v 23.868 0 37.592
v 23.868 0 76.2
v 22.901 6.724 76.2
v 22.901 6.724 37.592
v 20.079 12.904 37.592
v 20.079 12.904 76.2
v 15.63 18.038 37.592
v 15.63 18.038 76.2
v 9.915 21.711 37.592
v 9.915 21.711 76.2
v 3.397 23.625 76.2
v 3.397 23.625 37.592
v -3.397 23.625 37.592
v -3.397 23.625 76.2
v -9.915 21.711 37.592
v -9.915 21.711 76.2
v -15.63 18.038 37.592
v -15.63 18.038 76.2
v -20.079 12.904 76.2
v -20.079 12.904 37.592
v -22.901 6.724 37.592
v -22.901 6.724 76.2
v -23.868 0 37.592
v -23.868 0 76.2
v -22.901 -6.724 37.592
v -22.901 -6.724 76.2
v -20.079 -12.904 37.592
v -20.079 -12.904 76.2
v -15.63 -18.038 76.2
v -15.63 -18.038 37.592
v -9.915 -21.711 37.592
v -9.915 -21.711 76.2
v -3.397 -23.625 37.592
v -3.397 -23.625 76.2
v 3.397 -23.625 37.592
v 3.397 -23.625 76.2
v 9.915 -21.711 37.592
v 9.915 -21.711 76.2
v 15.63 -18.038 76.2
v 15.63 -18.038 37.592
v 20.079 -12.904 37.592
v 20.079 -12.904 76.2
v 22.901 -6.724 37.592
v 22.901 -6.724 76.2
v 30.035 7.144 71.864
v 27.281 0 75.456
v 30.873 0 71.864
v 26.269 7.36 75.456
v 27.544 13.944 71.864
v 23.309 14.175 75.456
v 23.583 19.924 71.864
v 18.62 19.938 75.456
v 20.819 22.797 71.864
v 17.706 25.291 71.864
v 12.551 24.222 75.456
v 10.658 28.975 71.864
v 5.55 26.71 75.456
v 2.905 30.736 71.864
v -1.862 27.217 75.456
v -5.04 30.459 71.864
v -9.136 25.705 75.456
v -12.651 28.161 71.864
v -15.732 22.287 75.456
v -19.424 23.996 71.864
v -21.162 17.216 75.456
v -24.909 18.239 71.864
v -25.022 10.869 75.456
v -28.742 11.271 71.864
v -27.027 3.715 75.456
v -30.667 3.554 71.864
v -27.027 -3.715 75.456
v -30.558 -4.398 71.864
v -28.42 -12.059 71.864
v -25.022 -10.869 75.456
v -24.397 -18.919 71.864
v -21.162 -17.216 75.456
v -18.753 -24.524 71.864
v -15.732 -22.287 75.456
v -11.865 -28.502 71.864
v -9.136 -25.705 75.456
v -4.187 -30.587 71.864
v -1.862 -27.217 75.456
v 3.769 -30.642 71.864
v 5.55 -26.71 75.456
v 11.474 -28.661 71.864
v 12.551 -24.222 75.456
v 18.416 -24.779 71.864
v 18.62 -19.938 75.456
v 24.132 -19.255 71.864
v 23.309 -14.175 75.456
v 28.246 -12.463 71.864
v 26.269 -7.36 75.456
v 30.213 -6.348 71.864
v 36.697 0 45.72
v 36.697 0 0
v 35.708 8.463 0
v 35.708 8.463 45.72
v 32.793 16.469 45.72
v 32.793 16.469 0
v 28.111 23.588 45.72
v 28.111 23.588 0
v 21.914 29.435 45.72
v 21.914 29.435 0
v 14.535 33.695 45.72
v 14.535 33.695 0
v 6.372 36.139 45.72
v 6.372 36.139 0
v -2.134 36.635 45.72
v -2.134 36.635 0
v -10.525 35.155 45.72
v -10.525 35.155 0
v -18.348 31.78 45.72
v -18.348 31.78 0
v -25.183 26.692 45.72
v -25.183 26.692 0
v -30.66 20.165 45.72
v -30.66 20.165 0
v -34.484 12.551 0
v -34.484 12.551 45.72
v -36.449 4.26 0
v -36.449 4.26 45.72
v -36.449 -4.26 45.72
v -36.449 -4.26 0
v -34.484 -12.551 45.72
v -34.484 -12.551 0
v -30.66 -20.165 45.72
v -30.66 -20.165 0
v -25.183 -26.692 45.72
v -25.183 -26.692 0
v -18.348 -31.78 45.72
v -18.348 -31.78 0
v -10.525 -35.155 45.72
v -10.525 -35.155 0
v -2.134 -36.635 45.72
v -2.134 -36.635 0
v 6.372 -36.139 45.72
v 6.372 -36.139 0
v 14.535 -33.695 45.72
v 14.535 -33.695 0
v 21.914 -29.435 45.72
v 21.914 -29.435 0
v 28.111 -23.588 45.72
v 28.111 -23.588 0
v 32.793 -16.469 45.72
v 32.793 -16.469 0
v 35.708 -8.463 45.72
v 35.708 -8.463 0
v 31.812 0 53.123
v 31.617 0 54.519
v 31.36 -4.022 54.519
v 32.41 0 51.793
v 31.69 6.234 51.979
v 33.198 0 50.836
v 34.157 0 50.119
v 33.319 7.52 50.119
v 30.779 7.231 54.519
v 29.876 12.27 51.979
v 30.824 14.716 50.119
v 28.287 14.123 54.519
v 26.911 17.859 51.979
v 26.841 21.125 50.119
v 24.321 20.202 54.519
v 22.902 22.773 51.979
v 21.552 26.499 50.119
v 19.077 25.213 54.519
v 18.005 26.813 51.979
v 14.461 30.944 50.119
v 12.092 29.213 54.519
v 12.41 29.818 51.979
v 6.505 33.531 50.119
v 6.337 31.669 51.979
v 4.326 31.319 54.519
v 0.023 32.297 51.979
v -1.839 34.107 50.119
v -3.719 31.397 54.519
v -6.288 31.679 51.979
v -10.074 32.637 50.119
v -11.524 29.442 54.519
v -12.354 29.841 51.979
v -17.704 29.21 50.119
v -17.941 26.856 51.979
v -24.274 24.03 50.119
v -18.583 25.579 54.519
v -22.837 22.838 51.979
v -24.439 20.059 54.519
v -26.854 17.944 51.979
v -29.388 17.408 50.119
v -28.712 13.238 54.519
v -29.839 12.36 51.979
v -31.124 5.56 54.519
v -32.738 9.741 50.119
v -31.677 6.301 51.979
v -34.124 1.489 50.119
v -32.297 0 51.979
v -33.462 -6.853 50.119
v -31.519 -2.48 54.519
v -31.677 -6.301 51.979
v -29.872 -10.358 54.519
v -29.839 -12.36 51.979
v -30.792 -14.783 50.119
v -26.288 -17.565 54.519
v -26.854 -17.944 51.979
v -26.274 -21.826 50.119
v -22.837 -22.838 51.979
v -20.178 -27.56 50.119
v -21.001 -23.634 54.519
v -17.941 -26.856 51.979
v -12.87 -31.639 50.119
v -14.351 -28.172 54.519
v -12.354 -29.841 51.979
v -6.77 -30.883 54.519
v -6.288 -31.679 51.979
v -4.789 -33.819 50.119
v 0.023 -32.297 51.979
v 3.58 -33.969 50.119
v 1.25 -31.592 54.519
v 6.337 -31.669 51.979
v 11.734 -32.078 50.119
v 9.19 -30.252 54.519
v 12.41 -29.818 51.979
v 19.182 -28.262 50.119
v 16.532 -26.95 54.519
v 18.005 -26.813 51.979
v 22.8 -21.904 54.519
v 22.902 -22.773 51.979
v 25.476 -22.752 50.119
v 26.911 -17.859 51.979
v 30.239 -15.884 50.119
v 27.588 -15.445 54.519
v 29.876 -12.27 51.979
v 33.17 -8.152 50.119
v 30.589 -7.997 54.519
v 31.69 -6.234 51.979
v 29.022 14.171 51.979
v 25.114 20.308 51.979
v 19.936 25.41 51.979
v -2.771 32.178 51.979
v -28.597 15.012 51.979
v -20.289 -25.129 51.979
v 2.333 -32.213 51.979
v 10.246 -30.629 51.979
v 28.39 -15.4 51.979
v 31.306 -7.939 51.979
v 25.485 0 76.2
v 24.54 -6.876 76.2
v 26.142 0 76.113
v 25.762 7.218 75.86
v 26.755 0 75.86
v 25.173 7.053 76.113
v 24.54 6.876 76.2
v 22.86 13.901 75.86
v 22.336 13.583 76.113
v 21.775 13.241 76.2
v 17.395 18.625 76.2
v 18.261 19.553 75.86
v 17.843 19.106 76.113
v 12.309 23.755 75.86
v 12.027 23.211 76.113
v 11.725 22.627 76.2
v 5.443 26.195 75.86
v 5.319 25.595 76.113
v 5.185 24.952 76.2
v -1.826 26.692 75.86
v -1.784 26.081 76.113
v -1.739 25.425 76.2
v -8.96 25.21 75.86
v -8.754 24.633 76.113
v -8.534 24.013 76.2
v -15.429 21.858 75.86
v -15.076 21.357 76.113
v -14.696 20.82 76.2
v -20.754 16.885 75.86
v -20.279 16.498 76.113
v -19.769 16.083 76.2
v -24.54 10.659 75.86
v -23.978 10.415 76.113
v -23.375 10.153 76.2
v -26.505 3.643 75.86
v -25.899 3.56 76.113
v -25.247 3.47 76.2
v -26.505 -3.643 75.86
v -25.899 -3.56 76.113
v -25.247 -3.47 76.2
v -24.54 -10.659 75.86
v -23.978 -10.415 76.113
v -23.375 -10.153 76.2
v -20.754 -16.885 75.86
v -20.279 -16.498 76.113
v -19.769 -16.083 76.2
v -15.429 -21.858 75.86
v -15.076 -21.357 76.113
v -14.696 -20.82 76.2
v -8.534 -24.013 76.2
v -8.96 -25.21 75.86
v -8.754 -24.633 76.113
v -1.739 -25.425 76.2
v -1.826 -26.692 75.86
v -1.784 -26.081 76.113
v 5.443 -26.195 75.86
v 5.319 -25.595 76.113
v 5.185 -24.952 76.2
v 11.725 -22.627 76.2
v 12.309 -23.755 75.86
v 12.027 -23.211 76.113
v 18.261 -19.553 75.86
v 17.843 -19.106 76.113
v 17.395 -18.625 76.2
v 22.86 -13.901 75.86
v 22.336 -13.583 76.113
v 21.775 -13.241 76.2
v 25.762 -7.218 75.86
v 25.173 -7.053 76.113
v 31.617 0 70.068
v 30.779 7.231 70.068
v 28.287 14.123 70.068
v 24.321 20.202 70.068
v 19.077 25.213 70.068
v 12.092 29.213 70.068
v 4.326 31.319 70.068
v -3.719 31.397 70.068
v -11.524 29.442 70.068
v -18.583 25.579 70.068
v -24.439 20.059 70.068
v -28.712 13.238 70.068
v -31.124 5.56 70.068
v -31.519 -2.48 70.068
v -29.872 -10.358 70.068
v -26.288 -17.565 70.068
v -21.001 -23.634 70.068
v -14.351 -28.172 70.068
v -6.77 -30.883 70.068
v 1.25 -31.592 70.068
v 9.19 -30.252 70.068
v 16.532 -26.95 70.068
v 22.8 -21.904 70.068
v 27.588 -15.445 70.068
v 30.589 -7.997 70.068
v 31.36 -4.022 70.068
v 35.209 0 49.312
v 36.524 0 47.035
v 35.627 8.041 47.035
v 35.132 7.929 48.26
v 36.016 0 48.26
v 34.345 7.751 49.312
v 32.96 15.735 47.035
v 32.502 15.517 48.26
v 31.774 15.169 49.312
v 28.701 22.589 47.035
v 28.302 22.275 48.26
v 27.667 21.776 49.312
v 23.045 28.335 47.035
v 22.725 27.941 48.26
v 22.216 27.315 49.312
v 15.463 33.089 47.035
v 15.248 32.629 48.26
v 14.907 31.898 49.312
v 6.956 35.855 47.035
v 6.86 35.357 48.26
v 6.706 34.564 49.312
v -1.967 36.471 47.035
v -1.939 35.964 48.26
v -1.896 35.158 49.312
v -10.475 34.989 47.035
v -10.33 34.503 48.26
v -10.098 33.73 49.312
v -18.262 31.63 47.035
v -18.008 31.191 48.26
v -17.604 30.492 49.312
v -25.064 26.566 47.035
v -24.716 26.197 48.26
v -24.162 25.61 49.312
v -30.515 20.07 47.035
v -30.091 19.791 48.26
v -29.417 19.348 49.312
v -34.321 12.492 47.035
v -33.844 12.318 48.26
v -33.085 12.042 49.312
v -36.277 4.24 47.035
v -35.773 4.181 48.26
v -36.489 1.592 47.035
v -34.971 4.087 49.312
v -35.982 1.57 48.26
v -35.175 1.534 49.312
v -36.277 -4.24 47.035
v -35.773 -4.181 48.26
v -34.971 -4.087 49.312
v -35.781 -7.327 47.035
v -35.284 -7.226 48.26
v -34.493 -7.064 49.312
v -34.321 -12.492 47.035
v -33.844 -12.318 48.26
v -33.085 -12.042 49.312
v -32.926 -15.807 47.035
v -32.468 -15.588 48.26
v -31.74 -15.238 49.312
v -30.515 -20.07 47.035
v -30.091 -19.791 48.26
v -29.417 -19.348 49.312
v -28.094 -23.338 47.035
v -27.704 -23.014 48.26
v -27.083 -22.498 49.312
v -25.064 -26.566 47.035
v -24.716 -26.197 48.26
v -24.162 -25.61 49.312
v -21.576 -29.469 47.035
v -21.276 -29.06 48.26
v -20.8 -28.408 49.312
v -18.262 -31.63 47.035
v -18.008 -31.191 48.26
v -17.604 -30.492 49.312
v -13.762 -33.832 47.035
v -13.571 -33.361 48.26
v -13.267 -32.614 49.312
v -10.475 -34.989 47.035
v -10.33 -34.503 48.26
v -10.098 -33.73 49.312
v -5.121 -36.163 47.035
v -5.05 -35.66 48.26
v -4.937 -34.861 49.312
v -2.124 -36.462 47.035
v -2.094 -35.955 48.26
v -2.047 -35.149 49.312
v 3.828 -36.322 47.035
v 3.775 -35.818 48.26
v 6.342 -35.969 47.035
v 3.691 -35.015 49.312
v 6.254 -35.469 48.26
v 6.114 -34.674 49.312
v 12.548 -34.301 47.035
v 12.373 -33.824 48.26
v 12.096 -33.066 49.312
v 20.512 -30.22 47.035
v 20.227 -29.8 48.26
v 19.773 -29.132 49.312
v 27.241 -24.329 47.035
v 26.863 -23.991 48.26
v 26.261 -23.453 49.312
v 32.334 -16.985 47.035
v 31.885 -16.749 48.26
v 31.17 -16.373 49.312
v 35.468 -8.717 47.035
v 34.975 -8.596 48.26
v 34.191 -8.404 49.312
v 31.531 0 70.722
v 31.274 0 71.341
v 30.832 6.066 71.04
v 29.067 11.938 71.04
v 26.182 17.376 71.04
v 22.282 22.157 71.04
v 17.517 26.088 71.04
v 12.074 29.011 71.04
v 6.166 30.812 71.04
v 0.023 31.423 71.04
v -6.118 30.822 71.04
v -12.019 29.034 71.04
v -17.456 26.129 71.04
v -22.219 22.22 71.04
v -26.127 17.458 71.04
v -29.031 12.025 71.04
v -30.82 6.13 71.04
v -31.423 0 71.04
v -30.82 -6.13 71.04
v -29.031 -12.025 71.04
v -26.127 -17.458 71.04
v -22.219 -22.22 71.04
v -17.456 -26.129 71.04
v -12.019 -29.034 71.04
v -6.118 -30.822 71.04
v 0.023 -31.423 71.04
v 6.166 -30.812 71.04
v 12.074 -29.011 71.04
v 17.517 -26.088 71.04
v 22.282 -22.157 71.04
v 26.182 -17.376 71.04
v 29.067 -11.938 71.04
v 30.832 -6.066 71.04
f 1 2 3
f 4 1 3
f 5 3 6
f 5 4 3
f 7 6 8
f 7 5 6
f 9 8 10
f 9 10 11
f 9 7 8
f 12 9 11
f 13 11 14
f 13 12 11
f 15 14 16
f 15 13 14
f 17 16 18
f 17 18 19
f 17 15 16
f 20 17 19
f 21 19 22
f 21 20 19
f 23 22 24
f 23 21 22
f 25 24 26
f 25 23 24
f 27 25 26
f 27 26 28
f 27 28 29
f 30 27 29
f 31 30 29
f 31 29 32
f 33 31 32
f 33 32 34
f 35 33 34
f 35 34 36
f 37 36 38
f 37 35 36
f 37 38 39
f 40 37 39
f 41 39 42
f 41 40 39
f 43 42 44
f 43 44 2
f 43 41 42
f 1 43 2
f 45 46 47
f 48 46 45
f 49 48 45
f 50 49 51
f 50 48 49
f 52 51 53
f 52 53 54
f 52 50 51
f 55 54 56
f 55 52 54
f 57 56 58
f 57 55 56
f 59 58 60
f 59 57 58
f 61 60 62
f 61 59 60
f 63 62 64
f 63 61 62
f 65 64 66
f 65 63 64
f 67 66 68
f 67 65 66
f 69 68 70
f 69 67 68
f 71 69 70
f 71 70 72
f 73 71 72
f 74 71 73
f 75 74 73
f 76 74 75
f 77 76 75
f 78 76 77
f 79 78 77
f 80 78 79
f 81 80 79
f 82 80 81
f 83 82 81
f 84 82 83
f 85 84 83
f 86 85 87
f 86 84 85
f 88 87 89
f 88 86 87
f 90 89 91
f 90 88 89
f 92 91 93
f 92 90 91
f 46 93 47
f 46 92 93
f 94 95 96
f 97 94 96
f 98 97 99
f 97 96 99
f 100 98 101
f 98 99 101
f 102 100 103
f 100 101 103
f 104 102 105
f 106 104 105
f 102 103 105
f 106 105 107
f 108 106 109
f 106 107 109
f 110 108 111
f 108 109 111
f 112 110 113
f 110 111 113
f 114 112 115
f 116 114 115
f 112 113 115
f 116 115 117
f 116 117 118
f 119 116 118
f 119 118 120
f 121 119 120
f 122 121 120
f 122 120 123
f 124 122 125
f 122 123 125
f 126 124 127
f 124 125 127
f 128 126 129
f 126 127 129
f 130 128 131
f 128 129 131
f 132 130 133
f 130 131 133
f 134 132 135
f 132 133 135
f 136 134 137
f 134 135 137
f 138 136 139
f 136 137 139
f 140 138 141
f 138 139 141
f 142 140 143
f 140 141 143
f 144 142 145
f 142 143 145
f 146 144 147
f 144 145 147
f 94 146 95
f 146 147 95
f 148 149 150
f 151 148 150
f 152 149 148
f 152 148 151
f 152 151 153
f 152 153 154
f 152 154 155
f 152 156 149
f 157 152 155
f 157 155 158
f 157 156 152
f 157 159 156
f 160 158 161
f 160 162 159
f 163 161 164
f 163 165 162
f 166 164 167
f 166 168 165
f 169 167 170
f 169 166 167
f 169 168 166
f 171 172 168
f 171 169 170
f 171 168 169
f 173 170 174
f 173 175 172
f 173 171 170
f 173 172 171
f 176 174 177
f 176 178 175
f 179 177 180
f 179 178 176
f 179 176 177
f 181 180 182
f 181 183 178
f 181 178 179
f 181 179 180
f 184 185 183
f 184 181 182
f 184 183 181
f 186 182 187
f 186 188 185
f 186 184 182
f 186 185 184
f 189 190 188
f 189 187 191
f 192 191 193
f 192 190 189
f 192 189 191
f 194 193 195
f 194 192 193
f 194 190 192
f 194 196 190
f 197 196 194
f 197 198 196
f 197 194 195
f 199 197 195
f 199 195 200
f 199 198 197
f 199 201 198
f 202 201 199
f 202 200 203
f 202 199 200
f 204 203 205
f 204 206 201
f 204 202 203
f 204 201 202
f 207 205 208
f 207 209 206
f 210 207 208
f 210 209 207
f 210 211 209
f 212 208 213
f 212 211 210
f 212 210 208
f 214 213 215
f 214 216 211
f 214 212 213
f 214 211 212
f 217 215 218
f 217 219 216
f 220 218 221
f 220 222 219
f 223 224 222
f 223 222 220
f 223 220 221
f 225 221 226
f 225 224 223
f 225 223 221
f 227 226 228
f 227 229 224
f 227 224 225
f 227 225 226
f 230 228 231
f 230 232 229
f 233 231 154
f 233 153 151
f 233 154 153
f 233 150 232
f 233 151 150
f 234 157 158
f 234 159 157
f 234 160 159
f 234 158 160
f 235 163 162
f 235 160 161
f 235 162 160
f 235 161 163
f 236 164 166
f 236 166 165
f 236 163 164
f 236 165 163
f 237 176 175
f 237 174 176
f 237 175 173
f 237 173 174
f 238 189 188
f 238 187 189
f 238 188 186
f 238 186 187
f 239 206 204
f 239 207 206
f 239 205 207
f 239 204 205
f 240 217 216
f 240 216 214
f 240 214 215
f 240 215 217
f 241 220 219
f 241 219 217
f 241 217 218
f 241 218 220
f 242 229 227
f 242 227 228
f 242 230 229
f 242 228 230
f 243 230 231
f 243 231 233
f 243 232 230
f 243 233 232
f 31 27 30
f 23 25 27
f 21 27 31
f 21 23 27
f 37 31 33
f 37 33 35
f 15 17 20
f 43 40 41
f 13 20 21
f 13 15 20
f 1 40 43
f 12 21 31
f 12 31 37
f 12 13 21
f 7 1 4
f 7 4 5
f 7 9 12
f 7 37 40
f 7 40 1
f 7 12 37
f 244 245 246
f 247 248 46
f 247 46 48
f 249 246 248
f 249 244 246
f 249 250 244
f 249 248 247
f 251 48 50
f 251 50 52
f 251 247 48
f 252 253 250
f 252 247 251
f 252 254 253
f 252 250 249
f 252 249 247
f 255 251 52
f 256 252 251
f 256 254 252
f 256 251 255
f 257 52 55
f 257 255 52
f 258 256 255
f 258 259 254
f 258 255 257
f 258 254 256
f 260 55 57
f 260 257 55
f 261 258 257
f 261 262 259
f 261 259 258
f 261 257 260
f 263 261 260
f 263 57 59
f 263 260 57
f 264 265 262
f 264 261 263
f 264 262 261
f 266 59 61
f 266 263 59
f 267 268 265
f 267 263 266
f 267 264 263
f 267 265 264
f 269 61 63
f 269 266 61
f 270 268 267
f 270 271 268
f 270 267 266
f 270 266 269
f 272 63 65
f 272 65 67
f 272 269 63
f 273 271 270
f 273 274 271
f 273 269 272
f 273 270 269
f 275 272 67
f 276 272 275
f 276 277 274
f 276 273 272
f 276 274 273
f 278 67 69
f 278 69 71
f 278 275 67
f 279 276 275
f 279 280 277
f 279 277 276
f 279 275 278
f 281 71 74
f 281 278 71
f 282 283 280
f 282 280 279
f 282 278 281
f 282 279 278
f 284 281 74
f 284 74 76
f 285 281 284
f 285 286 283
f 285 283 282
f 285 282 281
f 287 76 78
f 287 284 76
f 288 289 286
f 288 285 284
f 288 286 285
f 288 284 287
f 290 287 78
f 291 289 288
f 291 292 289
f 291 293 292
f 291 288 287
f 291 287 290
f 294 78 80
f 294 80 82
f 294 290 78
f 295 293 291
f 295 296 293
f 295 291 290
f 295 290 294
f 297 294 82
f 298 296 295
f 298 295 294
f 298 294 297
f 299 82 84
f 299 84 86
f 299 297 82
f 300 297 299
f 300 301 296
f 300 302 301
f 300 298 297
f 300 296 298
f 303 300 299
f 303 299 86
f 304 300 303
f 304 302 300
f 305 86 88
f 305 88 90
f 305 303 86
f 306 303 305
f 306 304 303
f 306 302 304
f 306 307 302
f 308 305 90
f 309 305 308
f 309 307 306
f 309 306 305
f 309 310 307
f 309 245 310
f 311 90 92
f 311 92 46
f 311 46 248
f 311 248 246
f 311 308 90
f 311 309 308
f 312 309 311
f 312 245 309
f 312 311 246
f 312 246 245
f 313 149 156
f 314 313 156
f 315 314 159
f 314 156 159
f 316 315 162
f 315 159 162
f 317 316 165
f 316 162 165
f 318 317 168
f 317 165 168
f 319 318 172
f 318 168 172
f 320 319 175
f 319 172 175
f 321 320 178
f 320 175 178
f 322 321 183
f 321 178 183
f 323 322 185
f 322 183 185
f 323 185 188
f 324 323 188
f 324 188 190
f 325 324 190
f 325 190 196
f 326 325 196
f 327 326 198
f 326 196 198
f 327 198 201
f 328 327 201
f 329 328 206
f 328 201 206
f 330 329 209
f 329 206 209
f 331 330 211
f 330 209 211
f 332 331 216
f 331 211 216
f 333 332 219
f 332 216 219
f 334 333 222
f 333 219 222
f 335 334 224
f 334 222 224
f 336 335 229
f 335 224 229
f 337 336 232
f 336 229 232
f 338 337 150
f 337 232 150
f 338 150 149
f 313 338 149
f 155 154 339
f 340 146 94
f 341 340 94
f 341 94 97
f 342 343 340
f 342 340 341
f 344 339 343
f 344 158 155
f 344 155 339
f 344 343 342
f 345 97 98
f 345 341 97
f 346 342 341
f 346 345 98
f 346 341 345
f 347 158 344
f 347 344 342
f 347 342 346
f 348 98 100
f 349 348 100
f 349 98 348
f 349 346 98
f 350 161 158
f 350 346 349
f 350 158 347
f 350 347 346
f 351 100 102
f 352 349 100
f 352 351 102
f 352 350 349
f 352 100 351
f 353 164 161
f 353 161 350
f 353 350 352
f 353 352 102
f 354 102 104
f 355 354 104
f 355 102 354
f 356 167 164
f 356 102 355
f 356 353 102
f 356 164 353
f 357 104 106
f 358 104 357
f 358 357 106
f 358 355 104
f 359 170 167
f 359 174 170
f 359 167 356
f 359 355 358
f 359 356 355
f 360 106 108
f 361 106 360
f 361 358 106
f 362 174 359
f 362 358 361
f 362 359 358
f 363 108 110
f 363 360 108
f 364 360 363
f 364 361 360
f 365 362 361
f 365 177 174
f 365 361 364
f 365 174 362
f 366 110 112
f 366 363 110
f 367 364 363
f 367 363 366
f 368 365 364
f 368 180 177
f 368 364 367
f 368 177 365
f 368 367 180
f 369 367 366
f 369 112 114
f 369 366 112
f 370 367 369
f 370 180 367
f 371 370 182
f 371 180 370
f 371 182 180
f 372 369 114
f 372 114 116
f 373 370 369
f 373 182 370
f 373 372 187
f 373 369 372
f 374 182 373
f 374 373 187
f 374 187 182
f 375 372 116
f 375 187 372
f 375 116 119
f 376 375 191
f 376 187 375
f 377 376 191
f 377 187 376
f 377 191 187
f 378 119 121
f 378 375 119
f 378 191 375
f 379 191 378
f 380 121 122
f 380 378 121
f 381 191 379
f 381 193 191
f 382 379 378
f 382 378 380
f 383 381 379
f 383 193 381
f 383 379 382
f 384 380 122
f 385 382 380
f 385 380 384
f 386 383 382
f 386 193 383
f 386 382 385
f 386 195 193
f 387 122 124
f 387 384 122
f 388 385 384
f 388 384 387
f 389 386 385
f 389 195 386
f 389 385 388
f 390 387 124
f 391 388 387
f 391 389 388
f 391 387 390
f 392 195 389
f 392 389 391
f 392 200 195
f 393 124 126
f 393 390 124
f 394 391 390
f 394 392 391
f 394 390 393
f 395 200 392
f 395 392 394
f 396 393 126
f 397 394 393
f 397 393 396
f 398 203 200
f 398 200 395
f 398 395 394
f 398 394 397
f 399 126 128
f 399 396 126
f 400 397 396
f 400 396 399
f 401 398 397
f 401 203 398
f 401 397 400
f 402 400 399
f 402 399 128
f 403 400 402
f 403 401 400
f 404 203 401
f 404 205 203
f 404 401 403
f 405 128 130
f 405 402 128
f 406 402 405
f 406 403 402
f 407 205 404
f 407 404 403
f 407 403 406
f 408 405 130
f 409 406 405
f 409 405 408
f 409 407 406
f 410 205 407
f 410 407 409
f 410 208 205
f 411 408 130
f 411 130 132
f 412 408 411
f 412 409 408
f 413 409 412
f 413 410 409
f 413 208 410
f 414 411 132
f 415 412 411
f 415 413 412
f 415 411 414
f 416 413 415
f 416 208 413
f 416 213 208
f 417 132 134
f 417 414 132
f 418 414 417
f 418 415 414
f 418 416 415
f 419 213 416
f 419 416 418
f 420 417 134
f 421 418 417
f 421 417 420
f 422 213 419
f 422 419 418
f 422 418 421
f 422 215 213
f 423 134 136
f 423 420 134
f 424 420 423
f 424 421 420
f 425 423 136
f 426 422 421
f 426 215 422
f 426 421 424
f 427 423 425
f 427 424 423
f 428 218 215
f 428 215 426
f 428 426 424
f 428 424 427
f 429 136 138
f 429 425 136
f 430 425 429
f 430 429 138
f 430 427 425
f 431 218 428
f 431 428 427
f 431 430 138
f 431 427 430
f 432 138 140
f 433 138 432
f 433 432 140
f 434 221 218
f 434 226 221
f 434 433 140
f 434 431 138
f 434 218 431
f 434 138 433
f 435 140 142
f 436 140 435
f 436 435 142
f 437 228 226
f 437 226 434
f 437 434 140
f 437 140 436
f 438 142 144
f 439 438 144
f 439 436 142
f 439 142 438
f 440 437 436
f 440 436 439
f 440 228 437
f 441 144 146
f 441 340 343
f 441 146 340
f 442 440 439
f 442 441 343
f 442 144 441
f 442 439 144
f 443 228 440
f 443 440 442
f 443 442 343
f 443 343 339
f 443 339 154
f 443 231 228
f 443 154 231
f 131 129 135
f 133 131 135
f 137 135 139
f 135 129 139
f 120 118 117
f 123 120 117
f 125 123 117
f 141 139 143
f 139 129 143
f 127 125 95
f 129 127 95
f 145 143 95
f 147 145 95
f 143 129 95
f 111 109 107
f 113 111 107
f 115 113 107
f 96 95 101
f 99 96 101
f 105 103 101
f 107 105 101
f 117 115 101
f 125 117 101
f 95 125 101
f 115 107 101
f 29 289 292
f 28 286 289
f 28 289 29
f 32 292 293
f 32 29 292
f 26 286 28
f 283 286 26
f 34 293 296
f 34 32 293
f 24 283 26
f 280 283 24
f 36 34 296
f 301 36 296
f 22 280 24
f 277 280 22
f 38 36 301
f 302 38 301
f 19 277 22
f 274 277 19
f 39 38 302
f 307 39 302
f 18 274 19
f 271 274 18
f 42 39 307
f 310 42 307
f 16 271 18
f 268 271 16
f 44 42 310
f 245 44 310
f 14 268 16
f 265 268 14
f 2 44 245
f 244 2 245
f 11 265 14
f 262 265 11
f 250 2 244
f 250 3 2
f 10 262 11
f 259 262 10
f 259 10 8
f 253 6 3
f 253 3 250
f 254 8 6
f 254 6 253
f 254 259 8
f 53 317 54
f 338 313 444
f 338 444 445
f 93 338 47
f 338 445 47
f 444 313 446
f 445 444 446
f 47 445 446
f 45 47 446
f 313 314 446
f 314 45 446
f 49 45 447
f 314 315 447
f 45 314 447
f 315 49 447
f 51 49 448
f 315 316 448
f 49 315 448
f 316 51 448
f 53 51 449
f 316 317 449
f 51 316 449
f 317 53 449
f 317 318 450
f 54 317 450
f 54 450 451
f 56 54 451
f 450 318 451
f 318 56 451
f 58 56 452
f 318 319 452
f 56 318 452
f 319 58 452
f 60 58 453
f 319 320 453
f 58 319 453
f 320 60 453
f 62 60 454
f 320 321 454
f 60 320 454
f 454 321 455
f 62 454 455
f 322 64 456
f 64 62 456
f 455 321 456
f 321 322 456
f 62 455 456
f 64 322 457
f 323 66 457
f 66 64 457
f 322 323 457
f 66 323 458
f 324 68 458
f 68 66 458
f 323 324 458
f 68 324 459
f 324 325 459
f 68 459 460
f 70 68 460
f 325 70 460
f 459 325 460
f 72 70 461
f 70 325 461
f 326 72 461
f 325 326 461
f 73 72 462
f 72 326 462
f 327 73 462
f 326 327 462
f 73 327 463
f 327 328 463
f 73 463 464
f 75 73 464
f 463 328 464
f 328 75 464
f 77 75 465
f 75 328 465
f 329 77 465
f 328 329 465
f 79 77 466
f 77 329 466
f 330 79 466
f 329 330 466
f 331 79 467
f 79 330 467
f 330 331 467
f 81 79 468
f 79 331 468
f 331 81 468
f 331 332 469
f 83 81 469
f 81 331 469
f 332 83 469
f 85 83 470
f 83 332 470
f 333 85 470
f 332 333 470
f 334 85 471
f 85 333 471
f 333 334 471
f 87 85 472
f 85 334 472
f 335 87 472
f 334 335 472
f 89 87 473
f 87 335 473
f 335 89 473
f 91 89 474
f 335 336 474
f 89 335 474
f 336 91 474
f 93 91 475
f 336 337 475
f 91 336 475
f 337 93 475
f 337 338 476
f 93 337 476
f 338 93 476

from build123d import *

# Parameters (mm, degrees)
F0_R     = 36.6966973779
F1_DEPTH = 50.8
F2_R     = 5.08
F3_R     = 23.8679289638
F4_DEPTH = 13.208
F5_DEPTH = 25.4
F6_R     = 5.08
F7_SIZE  = 5.08
F8_R     = 2.54


# Not quite as in the source:
# - two fillets or chamfers of one size are made in one step


with BuildPart() as f1:
    # F0 (on Top) → F1 (new body)
    with BuildSketch(Plane.XY):
        Circle(F0_R)
    extrude(amount=F1_DEPTH)

    # F2
    f2_edges = [f1.edges().sort_by_distance(p)[0] for p in [
        (-36.696697, 0, 50.8),
    ]]
    fillet(f2_edges, radius=F2_R)

    # F3 (on face) → F4 (cut)
    with BuildSketch(Plane.XY.offset(50.8)):
        Circle(F3_R)
    extrude(amount=-F4_DEPTH, mode=Mode.SUBTRACT)

    # F5 (add): a face of the model
    f5_faces = [f1.faces().sort_by_distance(p)[0] for p in [
        (-30.7224421333, 0, 50.8),
    ]]
    extrude(f5_faces, amount=F5_DEPTH)

    # F6
    f6_edges = [f1.edges().sort_by_distance(p)[0] for p in [
        (-31.616697, 0, 50.8),
    ]]
    fillet(f6_edges, radius=F6_R)

    # F7
    f7_edges = [f1.edges().sort_by_distance(p)[0] for p in [
        (-31.616697, 0, 76.2),
    ]]
    chamfer(f7_edges, length=F7_SIZE)

    # F8
    f8_edges = [f1.edges().sort_by_distance(p)[0] for p in [
        (-31.616697, 0, 71.12),
        (-26.536697, 0, 76.2),
    ]]
    fillet(f8_edges, radius=F8_R)


solid = f1.part
